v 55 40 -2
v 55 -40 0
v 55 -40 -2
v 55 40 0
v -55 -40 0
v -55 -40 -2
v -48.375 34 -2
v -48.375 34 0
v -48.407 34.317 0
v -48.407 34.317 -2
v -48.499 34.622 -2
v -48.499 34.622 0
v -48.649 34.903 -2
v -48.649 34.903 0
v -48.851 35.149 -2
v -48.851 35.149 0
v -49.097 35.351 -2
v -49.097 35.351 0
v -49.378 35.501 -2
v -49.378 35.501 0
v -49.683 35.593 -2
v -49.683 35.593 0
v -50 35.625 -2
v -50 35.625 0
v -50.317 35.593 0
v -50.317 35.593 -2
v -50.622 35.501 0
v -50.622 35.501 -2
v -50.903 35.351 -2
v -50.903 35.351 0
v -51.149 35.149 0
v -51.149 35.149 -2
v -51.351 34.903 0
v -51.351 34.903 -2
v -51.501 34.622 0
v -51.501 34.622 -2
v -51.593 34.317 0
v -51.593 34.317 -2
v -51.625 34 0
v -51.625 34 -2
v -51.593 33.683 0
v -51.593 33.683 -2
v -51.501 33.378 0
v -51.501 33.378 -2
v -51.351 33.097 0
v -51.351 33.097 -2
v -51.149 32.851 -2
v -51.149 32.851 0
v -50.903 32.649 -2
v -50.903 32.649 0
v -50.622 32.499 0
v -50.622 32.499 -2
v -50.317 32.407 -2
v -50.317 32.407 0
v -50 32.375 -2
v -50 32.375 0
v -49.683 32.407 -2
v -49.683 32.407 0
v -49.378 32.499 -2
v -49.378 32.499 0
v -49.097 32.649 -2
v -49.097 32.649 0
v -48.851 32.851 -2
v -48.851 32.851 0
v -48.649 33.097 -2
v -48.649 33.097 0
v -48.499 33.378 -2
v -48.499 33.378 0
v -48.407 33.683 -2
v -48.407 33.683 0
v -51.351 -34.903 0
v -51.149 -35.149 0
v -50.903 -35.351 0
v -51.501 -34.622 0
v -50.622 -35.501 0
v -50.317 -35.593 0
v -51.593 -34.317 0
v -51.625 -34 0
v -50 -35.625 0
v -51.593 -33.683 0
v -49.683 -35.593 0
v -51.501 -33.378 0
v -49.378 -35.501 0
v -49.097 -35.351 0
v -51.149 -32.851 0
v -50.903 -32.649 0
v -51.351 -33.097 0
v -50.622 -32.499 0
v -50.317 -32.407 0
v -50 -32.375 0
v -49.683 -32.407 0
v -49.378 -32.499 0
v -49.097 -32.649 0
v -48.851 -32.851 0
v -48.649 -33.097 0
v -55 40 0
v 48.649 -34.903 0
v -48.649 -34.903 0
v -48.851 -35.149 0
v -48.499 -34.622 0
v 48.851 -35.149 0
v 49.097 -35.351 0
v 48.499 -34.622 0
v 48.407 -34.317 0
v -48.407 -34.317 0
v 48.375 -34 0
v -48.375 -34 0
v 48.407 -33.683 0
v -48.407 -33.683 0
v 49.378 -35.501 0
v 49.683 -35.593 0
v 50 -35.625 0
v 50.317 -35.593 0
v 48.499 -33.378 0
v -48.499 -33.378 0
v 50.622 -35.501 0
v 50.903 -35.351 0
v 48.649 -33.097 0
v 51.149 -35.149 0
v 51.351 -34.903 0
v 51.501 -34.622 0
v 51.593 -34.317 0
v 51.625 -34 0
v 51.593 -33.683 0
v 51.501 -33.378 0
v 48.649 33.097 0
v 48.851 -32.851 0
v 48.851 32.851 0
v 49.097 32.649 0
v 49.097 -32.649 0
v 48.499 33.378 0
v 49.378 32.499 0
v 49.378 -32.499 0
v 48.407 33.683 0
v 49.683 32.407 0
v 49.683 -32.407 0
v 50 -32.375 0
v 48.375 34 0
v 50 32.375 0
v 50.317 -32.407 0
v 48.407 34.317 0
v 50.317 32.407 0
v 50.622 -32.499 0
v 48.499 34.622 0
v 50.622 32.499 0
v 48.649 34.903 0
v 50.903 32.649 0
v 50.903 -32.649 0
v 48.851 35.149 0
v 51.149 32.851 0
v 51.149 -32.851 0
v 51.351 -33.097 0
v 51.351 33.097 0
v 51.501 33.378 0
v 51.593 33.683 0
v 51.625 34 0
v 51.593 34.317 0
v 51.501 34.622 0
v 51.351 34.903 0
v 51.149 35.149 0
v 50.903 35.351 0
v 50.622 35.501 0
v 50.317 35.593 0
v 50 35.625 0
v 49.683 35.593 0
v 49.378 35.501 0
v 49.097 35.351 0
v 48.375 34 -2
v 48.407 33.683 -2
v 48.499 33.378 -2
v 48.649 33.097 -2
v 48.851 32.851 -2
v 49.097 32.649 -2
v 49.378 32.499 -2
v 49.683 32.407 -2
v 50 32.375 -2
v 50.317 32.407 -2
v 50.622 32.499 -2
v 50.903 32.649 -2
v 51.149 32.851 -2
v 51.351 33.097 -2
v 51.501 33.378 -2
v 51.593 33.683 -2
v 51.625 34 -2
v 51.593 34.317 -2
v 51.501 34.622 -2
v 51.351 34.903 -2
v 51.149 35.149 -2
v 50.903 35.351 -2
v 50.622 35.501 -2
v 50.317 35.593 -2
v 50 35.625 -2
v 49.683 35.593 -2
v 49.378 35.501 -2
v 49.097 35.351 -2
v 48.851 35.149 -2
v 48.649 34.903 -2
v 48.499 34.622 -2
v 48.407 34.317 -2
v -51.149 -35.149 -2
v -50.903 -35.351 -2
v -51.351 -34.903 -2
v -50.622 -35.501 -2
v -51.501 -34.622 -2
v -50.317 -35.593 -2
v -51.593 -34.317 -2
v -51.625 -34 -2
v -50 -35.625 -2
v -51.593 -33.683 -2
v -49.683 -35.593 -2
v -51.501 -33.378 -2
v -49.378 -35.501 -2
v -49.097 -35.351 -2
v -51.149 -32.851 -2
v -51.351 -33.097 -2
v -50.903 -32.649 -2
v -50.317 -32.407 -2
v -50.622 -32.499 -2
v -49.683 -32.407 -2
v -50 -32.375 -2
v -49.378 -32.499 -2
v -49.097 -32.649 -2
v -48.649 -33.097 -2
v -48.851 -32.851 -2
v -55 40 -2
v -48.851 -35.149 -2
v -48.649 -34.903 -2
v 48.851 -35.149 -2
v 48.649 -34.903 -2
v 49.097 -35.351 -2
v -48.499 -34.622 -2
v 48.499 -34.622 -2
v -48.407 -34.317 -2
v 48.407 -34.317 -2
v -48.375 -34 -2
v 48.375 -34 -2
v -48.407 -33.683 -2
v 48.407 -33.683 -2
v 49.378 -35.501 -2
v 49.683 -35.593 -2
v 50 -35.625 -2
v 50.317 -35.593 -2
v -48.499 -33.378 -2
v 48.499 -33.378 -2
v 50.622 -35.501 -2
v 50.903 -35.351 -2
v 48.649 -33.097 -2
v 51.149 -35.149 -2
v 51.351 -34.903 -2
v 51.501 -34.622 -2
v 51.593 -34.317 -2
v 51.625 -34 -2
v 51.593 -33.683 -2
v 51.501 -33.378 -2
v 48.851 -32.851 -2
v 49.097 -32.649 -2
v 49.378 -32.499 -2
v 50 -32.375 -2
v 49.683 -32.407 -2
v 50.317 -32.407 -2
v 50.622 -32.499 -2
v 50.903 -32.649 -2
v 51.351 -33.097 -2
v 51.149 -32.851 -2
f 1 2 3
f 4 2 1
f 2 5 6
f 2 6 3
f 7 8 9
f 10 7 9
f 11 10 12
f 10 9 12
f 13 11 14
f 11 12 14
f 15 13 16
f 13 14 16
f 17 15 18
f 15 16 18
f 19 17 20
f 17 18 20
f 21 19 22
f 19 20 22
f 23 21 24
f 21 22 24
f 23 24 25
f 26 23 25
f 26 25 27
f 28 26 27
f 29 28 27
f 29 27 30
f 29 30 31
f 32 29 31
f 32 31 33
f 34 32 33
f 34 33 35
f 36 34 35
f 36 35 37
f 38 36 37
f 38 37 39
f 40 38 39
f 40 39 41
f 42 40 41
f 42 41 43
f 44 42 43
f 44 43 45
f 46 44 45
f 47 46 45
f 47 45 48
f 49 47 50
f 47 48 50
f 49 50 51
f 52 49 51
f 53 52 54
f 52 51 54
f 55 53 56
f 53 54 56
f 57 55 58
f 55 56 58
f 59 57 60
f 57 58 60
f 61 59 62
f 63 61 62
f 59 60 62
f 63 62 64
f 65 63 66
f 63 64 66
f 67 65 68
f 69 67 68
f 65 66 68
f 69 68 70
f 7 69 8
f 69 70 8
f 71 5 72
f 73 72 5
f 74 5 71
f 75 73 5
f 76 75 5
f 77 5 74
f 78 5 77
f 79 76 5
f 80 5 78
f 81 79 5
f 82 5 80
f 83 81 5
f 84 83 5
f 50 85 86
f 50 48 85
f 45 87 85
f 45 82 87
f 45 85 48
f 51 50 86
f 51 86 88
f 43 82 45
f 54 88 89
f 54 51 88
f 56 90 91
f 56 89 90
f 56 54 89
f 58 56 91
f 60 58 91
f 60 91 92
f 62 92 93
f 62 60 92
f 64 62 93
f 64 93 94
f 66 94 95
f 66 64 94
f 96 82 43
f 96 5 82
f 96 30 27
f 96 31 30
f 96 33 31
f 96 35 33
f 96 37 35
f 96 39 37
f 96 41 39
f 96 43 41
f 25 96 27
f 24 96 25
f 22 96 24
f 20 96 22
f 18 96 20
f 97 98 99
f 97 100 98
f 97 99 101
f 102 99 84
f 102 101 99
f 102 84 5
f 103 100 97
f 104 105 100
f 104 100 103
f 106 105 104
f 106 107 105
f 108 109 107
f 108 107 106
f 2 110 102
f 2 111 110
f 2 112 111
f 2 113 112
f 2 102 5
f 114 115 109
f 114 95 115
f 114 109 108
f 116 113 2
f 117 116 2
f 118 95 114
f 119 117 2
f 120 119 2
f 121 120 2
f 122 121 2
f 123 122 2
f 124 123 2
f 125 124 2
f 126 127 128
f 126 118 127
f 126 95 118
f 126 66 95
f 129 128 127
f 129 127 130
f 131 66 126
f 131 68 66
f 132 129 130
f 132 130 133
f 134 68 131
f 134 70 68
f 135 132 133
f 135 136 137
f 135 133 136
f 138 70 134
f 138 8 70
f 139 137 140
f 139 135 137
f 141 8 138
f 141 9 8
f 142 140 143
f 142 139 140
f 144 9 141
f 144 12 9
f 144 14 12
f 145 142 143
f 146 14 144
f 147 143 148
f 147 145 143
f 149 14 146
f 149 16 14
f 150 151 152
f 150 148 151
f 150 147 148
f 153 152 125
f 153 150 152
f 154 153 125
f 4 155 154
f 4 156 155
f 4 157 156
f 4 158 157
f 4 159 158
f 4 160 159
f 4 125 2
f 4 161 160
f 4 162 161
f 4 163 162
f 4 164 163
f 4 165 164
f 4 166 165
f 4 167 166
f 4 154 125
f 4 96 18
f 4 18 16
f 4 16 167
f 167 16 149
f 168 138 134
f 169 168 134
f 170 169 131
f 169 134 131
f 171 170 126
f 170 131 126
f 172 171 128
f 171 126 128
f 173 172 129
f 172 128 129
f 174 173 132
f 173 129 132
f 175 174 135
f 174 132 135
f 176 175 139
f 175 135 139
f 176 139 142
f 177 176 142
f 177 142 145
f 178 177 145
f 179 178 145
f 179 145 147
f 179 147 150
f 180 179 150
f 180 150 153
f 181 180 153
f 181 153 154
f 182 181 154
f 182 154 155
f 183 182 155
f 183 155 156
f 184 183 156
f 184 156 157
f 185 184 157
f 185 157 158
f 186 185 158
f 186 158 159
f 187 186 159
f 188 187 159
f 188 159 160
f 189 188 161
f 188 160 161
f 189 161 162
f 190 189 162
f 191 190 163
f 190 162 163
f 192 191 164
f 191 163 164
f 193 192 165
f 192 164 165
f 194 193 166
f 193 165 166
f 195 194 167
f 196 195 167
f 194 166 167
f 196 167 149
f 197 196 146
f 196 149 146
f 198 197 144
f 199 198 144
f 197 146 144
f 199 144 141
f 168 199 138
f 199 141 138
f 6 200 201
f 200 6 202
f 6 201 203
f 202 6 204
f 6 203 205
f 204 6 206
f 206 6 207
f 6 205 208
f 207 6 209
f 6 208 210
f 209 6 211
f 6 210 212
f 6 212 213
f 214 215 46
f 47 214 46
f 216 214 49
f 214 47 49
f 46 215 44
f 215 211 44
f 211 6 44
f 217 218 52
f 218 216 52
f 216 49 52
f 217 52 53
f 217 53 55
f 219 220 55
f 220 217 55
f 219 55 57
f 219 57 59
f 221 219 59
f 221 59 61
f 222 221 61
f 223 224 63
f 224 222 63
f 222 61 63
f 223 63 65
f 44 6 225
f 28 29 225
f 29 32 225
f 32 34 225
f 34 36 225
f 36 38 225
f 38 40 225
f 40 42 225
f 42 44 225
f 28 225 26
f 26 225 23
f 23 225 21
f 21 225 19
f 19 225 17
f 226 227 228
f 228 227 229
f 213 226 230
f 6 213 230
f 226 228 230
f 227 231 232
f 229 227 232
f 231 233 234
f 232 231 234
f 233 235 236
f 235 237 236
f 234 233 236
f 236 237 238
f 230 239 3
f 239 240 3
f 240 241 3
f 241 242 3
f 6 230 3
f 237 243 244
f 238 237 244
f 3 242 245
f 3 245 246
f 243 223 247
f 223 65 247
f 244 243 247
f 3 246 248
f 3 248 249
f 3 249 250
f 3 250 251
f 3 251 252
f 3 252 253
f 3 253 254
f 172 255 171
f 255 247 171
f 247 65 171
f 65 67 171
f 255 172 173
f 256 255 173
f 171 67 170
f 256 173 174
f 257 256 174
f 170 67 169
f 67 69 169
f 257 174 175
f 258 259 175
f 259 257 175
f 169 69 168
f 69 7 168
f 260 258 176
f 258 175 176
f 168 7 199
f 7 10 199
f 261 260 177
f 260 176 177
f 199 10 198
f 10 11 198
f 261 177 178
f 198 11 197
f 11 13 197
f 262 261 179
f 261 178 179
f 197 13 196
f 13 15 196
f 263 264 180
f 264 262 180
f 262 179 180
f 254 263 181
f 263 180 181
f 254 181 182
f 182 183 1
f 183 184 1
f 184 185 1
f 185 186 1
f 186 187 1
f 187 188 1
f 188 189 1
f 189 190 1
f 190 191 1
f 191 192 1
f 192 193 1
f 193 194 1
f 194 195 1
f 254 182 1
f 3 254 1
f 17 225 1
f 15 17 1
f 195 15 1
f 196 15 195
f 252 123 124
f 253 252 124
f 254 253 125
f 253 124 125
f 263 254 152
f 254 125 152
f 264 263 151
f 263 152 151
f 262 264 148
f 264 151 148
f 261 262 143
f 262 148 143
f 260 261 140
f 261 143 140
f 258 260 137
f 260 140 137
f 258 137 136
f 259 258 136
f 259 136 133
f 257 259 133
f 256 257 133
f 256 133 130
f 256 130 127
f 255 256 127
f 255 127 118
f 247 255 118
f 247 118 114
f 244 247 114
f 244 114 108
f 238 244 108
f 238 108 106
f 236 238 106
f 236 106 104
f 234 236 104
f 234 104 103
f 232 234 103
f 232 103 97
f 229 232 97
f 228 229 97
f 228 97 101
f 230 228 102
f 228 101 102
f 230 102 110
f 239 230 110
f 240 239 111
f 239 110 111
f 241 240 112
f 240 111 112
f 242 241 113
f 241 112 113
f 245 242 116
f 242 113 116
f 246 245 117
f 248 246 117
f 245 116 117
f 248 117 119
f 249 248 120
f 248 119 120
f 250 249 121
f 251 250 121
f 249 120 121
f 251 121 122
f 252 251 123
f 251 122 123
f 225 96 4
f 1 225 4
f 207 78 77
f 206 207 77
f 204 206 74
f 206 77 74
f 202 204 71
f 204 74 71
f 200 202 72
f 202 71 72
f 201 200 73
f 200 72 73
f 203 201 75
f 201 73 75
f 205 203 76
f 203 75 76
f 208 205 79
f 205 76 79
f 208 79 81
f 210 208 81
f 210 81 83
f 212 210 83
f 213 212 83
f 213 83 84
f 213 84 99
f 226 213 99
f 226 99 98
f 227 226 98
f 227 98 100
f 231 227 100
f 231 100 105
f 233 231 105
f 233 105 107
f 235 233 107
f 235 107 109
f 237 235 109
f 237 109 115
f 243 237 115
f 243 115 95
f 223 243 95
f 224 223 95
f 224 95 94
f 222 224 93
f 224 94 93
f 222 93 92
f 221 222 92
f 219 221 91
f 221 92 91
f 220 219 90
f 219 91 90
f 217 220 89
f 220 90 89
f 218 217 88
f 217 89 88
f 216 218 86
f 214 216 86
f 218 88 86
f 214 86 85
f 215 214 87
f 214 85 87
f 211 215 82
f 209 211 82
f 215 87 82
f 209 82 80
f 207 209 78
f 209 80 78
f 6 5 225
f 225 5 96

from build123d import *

# Parameters (mm, degrees)
SKETCH1_W           = 110
SKETCH1_H           = 80
BOSS_EXTRUDE1_DEPTH = 2
SKETCH2_R           = 1.624633008
CUT_EXTRUDE1_DEPTH  = 69.036754773


with BuildPart() as part:
    # Sketch1 → Boss-Extrude1 (new body)
    with BuildSketch(Plane.XY):
        Rectangle(SKETCH1_W, SKETCH1_H)
    extrude(amount=-BOSS_EXTRUDE1_DEPTH)

    # Sketch2 → Cut-Extrude1 (cut, through all)
    with BuildSketch(Plane.XY):
        with Locations((-50, 34)):
            Circle(SKETCH2_R)
        with Locations(Location((50, 34, 0), (0, 0, 180))):
            Circle(SKETCH2_R)
        with Locations((50, -34)):
            Circle(SKETCH2_R)
        with Locations(Location((-50, -34, 0), (0, 0, 180))):
            Circle(SKETCH2_R)
    extrude(amount=-CUT_EXTRUDE1_DEPTH, mode=Mode.SUBTRACT)


solid = part.part
